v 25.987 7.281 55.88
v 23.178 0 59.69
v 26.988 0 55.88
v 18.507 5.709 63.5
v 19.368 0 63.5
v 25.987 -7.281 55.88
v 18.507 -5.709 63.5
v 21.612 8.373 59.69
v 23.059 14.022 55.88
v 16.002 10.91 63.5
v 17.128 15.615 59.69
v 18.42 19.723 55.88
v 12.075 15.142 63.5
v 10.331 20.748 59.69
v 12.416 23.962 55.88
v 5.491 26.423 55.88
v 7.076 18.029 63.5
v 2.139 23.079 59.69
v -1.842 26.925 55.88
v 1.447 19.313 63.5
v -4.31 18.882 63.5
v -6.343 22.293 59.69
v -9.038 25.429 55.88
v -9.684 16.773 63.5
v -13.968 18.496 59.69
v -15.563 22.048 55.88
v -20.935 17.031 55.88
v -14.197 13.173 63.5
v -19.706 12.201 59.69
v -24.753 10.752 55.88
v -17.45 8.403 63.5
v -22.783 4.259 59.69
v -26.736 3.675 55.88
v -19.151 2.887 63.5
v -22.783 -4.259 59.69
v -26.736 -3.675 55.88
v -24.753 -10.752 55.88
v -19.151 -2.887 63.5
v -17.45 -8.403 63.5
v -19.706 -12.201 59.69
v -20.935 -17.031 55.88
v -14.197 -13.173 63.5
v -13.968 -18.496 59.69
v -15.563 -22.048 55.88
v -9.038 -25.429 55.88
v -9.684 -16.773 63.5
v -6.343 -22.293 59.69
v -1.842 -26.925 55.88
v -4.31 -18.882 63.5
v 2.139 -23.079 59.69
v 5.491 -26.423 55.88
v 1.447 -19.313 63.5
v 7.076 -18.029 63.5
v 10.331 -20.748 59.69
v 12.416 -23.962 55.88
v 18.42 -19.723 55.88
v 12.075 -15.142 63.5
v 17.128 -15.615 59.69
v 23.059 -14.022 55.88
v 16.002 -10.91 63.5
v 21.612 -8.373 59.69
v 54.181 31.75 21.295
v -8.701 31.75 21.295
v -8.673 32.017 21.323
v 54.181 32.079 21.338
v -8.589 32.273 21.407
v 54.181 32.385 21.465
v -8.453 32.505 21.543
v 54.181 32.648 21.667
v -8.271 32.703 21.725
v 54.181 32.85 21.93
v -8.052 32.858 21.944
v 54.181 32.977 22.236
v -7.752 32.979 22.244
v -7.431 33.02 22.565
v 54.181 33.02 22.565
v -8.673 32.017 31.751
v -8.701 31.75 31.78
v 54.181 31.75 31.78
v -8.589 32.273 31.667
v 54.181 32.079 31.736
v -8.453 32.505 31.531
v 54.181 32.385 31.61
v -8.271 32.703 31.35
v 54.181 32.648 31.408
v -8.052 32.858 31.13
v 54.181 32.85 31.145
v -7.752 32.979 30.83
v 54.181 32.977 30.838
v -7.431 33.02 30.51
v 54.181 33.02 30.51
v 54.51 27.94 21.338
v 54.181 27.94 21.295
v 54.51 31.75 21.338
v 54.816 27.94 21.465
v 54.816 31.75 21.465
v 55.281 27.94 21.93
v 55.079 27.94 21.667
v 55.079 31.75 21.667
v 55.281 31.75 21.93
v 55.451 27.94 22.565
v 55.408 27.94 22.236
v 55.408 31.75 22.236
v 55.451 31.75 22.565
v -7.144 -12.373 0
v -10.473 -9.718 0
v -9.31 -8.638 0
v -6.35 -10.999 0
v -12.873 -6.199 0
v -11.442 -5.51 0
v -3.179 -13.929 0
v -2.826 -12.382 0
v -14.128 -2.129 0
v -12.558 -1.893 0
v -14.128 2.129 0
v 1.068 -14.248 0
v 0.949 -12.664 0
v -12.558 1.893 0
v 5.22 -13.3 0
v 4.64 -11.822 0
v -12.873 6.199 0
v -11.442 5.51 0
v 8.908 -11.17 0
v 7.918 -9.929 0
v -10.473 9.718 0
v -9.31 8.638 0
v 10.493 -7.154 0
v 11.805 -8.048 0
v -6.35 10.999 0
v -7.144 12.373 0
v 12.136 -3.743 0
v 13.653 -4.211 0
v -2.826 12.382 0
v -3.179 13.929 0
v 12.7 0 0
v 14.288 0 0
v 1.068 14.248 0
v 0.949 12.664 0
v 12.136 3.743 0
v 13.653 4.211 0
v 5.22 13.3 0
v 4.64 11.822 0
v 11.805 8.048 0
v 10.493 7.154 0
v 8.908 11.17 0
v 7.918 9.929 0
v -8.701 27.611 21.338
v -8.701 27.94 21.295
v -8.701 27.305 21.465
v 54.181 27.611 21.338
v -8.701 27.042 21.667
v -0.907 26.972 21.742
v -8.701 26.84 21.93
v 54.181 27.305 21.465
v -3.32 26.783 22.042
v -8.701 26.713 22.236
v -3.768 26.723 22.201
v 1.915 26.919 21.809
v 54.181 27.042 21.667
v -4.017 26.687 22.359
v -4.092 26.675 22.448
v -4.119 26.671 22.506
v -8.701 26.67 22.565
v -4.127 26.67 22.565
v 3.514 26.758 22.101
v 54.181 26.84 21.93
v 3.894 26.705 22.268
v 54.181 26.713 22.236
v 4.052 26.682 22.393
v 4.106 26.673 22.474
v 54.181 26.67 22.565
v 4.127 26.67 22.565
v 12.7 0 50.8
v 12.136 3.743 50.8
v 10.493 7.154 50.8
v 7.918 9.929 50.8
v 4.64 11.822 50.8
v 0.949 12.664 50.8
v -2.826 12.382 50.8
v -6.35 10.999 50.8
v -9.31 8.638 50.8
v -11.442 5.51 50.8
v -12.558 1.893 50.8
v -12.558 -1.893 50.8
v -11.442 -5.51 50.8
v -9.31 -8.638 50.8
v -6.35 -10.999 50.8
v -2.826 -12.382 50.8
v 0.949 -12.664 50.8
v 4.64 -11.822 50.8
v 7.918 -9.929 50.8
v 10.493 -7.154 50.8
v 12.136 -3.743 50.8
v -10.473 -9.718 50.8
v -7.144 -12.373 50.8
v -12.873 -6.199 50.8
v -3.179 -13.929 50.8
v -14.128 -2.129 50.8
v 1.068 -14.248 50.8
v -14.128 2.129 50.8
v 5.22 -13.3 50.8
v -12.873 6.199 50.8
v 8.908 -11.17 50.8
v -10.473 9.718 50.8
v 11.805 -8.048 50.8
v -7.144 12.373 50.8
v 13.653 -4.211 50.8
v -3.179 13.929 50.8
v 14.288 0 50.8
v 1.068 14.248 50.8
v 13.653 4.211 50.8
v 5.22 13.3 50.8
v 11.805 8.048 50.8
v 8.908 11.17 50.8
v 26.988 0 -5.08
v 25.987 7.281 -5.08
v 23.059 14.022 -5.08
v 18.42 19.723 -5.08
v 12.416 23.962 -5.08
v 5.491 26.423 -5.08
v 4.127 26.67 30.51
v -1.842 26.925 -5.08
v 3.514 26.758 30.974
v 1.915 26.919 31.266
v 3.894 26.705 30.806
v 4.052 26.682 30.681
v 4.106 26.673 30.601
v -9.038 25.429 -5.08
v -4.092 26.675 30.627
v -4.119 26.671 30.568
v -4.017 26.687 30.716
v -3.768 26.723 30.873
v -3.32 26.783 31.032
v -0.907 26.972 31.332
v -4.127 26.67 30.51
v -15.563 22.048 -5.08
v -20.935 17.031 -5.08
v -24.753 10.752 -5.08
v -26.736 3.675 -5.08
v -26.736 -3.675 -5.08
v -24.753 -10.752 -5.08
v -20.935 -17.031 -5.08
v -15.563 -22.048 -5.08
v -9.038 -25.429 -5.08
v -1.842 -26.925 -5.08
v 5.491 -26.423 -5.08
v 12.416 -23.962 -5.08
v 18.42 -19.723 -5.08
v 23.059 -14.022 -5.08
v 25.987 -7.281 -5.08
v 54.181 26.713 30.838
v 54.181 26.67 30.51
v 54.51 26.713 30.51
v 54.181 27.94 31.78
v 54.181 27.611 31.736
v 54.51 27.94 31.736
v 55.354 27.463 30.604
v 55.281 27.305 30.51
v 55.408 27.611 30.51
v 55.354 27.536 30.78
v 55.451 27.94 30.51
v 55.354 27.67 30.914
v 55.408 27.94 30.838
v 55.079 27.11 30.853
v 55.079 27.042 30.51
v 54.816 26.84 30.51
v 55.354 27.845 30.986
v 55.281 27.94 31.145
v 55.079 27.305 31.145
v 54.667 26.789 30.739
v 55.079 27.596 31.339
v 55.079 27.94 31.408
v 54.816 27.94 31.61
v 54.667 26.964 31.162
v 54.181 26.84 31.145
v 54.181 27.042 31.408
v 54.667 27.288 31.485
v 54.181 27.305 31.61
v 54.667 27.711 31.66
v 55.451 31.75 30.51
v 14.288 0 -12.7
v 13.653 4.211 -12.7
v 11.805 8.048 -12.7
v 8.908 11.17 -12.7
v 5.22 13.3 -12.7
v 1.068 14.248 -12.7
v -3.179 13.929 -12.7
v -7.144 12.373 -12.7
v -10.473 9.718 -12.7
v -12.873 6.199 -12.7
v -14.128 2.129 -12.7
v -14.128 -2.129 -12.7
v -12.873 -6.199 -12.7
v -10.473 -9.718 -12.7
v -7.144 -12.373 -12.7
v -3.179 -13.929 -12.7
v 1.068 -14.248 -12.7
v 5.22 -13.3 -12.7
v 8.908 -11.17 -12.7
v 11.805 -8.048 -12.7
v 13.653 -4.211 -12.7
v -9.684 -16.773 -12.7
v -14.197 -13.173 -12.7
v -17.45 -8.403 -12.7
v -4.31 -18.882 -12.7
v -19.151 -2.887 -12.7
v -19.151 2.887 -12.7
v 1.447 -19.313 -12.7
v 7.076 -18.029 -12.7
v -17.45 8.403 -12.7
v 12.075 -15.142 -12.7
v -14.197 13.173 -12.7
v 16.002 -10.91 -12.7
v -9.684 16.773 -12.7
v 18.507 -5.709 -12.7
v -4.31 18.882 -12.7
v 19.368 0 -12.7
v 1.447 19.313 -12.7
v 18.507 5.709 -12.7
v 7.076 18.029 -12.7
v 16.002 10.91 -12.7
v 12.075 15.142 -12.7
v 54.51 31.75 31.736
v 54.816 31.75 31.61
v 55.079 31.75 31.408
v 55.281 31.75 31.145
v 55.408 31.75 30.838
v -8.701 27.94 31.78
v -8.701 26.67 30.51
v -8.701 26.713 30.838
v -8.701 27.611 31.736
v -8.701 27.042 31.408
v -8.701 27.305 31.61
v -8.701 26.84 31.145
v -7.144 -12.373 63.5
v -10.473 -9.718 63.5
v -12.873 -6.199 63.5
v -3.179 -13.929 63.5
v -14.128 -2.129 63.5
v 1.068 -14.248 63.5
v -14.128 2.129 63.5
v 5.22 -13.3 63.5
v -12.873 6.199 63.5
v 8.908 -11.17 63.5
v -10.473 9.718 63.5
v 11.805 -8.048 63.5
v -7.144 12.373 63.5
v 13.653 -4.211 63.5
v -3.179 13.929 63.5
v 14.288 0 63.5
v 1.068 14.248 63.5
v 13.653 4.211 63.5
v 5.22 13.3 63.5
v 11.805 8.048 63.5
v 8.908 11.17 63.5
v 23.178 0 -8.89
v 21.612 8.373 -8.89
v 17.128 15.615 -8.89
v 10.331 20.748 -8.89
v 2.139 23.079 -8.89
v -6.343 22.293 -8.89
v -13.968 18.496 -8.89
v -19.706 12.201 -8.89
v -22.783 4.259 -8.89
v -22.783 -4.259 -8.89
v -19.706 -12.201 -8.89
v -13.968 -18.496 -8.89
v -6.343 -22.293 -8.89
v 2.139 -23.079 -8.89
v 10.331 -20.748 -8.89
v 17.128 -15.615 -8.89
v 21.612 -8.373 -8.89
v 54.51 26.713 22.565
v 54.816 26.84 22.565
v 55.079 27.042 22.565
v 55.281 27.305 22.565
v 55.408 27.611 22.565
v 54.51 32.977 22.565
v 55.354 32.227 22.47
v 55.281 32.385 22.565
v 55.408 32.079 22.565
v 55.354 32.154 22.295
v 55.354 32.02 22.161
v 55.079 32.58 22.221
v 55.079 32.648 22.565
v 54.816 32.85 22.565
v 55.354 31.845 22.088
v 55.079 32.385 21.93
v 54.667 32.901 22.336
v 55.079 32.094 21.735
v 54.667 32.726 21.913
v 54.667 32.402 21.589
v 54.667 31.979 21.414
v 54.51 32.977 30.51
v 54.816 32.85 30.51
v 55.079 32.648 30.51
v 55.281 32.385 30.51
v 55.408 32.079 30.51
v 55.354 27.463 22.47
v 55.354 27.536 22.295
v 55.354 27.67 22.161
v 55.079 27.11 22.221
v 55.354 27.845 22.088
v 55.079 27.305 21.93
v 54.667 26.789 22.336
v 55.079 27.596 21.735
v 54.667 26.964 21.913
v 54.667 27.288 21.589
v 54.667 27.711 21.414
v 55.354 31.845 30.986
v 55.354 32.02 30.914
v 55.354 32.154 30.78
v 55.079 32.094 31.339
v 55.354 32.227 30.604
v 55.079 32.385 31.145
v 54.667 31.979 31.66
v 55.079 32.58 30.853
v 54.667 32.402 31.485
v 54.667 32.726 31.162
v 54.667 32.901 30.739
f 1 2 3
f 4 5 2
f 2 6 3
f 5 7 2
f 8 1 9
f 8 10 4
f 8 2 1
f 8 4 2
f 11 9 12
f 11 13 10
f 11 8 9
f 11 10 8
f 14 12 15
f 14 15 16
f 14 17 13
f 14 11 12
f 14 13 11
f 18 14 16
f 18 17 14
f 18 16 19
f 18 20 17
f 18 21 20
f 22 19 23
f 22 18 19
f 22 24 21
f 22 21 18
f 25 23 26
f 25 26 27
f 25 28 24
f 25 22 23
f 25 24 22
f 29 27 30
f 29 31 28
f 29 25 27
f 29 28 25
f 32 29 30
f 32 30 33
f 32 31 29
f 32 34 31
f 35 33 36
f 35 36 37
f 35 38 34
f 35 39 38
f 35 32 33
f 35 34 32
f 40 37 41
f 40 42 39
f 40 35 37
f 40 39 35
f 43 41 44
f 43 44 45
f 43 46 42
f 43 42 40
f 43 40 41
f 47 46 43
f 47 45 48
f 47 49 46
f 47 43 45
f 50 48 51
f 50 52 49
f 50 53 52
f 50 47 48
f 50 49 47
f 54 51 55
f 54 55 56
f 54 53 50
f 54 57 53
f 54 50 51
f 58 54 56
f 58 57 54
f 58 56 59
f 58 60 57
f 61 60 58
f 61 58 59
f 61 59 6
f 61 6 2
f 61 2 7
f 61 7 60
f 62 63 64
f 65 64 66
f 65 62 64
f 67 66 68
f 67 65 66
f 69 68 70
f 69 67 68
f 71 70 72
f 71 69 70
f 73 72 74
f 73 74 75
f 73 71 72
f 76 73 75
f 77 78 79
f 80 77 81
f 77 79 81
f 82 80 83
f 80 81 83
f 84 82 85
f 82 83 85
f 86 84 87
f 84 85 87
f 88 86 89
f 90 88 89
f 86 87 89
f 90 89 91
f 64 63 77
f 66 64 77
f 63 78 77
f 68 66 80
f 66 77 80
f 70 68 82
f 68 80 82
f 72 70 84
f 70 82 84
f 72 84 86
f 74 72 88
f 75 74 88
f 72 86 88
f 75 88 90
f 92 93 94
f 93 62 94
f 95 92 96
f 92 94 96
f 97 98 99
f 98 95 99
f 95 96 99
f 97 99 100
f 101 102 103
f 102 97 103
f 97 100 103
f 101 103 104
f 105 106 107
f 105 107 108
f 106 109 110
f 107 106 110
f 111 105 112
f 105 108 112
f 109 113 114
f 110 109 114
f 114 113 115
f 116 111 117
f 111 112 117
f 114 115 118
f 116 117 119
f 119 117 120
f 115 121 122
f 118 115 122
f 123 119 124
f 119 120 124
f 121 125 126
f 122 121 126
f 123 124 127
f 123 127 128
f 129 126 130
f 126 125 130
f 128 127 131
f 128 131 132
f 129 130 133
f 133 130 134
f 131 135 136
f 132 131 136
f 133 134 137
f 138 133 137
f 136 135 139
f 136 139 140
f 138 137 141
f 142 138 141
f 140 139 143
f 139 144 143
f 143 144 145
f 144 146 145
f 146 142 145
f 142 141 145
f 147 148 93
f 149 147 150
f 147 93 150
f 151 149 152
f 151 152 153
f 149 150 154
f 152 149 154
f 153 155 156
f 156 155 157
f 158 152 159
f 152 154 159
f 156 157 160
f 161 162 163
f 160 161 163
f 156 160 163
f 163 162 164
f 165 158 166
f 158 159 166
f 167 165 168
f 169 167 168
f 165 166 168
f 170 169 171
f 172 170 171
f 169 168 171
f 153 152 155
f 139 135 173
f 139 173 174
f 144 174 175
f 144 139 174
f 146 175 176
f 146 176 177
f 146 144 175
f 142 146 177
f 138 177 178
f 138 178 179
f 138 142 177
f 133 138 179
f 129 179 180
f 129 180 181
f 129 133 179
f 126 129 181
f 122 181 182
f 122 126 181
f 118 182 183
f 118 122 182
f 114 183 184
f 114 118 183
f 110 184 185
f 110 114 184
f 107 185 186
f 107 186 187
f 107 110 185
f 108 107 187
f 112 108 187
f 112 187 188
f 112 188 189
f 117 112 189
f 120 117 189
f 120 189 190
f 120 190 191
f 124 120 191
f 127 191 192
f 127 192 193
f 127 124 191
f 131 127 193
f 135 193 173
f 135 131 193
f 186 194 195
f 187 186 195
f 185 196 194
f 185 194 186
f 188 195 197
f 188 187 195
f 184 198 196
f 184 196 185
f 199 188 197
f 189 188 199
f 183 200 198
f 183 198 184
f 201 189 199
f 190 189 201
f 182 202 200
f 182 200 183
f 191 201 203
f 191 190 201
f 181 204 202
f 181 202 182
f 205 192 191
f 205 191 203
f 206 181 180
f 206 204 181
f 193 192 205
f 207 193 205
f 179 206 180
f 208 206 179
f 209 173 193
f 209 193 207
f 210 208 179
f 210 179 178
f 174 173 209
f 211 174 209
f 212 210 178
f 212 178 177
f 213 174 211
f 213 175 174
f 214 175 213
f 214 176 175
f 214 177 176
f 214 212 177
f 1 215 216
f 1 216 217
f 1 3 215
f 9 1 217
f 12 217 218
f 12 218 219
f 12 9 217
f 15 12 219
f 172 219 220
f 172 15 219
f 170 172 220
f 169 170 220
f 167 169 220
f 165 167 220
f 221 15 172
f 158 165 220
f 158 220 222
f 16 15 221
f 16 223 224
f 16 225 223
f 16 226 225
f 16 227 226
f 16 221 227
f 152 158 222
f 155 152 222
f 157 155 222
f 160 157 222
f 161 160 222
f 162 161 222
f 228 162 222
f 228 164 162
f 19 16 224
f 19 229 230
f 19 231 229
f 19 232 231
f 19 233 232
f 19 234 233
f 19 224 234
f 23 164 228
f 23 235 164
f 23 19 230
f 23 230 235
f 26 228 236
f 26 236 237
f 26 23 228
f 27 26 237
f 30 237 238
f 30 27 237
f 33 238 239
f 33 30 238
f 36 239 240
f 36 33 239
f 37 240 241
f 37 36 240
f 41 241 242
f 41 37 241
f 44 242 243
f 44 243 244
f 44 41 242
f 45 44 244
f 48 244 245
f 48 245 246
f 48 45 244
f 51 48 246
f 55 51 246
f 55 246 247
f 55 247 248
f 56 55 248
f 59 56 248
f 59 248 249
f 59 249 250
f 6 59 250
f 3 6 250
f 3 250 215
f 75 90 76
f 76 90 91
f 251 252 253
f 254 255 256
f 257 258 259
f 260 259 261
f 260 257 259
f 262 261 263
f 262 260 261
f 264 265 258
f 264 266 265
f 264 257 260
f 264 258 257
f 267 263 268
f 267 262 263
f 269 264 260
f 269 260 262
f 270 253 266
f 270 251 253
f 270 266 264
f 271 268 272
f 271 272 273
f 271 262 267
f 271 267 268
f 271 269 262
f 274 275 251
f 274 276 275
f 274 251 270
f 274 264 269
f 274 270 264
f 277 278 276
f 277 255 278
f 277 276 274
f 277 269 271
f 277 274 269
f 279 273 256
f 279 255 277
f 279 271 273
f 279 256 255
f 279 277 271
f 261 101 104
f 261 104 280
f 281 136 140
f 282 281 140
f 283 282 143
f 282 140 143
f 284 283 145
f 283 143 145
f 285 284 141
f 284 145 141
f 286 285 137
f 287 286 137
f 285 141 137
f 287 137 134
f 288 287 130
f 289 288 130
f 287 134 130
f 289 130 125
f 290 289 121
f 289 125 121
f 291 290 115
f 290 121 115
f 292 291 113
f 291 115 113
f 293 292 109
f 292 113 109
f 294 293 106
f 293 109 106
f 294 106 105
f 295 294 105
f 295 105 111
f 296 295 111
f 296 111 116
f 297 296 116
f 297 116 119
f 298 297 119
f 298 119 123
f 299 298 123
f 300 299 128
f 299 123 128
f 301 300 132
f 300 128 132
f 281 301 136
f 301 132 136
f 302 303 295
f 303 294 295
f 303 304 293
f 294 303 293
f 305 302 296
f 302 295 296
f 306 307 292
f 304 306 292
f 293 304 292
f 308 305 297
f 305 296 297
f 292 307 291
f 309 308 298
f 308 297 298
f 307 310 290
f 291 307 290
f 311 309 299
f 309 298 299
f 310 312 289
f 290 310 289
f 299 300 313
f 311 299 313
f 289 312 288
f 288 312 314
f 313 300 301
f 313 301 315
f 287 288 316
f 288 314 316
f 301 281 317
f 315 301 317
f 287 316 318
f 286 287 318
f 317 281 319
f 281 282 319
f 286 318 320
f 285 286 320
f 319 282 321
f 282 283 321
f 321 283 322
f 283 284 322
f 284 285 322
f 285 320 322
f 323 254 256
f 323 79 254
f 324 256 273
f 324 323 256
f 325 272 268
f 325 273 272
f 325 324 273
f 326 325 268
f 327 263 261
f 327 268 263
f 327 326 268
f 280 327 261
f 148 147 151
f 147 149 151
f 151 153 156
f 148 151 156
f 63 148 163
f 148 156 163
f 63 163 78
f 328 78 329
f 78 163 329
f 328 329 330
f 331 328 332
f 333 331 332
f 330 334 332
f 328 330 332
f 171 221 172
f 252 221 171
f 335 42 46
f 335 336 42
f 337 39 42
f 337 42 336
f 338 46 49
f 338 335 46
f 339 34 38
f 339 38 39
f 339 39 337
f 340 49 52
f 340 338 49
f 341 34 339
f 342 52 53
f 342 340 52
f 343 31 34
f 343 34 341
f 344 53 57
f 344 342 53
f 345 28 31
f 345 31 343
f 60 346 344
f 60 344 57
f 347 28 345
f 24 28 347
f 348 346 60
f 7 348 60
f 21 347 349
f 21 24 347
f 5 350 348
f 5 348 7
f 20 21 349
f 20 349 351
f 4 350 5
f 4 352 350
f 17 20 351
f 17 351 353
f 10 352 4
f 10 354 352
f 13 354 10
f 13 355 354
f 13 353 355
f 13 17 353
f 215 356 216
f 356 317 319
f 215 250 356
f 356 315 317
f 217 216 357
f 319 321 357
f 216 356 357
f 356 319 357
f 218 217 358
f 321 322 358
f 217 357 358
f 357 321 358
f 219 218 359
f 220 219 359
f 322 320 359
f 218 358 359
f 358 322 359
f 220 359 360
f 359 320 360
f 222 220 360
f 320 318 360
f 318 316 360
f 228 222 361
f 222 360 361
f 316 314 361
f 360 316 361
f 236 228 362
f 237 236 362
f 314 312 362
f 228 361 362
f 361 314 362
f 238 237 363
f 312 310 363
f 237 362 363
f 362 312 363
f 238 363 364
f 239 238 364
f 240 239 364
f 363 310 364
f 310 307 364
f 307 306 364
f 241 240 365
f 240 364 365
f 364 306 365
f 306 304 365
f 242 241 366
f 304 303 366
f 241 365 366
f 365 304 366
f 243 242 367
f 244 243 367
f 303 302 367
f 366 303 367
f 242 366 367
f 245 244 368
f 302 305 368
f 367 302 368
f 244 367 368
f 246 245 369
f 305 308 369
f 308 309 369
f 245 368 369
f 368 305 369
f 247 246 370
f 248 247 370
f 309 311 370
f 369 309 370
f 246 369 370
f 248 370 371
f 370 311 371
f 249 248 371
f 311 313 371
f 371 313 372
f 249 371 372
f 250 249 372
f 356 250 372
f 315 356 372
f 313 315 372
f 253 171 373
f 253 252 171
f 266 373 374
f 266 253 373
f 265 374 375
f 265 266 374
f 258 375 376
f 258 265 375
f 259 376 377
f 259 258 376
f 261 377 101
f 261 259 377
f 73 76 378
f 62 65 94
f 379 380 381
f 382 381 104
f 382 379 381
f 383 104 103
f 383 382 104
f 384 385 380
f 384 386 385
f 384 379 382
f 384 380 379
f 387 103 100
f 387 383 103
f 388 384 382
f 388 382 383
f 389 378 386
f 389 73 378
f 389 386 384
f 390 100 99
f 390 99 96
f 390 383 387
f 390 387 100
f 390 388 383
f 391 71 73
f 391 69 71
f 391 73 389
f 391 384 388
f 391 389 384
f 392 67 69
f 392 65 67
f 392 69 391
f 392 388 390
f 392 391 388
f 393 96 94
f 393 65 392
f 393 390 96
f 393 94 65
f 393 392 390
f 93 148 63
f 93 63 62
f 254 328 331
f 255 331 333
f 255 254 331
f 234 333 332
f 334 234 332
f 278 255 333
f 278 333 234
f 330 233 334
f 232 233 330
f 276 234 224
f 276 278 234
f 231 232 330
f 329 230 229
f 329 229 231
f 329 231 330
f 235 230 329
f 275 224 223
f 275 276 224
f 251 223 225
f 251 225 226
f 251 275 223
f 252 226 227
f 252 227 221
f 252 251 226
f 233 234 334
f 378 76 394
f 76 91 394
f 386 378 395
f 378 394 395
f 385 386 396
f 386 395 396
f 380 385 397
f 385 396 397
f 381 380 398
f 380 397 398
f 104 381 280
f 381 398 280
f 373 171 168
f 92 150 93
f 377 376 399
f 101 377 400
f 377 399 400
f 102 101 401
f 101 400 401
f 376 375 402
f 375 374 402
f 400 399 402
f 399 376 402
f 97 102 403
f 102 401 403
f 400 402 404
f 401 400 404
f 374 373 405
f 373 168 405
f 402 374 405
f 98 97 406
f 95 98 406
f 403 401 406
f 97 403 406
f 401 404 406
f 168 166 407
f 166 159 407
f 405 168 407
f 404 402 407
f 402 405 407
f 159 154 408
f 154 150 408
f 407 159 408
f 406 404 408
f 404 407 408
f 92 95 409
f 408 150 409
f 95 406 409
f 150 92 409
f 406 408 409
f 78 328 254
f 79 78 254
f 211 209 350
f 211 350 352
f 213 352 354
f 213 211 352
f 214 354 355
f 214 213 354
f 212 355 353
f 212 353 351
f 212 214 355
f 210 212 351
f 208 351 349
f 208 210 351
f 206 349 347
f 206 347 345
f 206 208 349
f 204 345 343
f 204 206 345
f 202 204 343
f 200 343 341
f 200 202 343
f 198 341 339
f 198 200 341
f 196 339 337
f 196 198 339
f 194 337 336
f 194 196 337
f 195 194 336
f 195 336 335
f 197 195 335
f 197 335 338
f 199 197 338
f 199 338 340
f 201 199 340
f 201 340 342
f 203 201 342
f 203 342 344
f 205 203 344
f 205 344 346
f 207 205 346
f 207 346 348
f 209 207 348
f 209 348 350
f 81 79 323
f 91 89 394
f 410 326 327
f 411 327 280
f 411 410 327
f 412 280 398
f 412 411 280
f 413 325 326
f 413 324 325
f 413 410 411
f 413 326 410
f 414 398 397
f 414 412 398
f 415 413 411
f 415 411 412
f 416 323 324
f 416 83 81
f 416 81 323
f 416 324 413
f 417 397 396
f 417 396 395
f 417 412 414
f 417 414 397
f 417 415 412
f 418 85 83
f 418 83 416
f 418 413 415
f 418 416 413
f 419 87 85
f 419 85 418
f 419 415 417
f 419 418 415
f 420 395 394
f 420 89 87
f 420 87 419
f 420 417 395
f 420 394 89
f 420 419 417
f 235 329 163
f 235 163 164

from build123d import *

# Parameters (mm, degrees)
F0_R          = 14.2875
F0_R_2        = 12.7
F2_DEPTH      = 50.8
F3_R          = 26.9875
F3_R_2        = 14.2875
F4_DEPTH      = 63.5
F4_DEPTH_BACK = 12.7
F5_SIZE       = 7.62
F7_START      = -26.67
F6_W          = 64.1522035003
F6_H          = 10.4847997427
F7_DEPTH      = 6.35
F8_R          = 1.26999


# Not quite as in the source:
# - a fillet or chamfer is up to 0.001 mm smaller than in the source, because OpenCascade refuses the exact size
# - a feature names something its author has since deleted; it is built from what else it names


with BuildPart() as f2:
    # F0 (on Top) → F2 (new body)
    with BuildSketch(Plane.XY):
        Circle(F0_R)
        Circle(F0_R_2, mode=Mode.SUBTRACT)
    extrude(amount=F2_DEPTH)

    # F3 (on face) → F4 (join, two sides)
    with BuildSketch(Plane.XY) as f4_sk:
        Circle(F3_R)
        Circle(F3_R_2, mode=Mode.SUBTRACT)
    extrude(amount=F4_DEPTH)
    extrude(f4_sk.sketch, amount=-F4_DEPTH_BACK)

    # F5
    f5_edges = [f2.edges().sort_by_distance(p)[0] for p in [
        (-26.9875, 0, 63.5),
        (-26.9875, 0, -12.7),
    ]]
    chamfer(f5_edges, length=F5_SIZE)

    # F6 (on Front) → F7 (join)
    with BuildSketch(Plane.XZ.offset(F7_START)):
        with Locations((23.3749561012, 26.5372619033)):
            Rectangle(F6_W, F6_H)
    extrude(amount=-F7_DEPTH)

    # F8 (radius 1.27 in the source; OpenCascade refuses exactly that, so slightly less here)
    f8_edges = [f2.edges().sort_by_distance(p)[0] for p in [
        (23.374956, 33.02, 31.779662),
        (23.374956, 33.02, 21.294862),
        (-8.701146, 33.02, 26.537262),
        (29.789279, 26.67, 21.294862),
        (29.789279, 26.67, 31.779662),
        (55.451058, 26.67, 26.537262),
        (55.451058, 29.845, 31.779662),
        (55.451058, 33.02, 26.537262),
        (55.451058, 29.845, 21.294862),
    ]]
    fillet(f8_edges, radius=F8_R)


solid = f2.part
